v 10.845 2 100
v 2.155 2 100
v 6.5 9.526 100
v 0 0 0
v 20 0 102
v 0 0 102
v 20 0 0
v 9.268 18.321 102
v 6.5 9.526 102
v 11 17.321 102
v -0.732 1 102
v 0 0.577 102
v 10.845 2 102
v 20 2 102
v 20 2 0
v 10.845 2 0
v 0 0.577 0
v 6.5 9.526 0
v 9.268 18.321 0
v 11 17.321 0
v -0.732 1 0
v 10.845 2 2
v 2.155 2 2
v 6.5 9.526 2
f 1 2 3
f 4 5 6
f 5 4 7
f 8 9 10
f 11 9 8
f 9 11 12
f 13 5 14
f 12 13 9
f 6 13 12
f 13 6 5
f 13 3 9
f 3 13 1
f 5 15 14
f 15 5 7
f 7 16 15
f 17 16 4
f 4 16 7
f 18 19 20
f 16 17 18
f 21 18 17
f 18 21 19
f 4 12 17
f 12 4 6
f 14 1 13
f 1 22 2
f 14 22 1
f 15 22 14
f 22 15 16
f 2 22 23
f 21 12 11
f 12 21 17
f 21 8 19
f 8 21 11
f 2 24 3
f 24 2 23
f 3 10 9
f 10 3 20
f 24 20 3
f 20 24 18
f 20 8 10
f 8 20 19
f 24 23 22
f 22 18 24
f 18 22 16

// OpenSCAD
/* 2022-05-12 holder for dishwasher status sign v2 */
/* by Torfinn Ingolfsen */

// History:
// 2022-05-12 initial version
//
// fasten with double sided tape on the front of the dishwasher
// so that the top side is clearly visible
//
sign_length = 100; // the gadget is going to be 110 mm wide
sign_height = 20; // and 20 mm high
side_thickness = 2;

module endpiece()
{
    side_size = sign_height / 2 + side_thickness;
    echo(side_size = side_size);
    t_height = (sqrt(3) / 2) * side_size;
    echo(t_height = t_height);
    linear_extrude(height = side_thickness, center = false, twist = 0, convexity = 10) polygon(points = [[0,0], [side_size, 0], [side_size / 2, t_height], [0,0]]);
}

//color("red") translate([0,0, sign_length + side_thickness]) endpiece();
color("red") translate([0,0, sign_length]) endpiece();
// width, depth, height
//   x  ,   y  ,  z
cube([sign_height, side_thickness, sign_length + side_thickness]);
translate([side_thickness / 2, 0, 0]) {
    rotate([0,0,60]) {
        cube([sign_height, side_thickness, sign_length + side_thickness]);
    }
}

color("blue") endpiece();
